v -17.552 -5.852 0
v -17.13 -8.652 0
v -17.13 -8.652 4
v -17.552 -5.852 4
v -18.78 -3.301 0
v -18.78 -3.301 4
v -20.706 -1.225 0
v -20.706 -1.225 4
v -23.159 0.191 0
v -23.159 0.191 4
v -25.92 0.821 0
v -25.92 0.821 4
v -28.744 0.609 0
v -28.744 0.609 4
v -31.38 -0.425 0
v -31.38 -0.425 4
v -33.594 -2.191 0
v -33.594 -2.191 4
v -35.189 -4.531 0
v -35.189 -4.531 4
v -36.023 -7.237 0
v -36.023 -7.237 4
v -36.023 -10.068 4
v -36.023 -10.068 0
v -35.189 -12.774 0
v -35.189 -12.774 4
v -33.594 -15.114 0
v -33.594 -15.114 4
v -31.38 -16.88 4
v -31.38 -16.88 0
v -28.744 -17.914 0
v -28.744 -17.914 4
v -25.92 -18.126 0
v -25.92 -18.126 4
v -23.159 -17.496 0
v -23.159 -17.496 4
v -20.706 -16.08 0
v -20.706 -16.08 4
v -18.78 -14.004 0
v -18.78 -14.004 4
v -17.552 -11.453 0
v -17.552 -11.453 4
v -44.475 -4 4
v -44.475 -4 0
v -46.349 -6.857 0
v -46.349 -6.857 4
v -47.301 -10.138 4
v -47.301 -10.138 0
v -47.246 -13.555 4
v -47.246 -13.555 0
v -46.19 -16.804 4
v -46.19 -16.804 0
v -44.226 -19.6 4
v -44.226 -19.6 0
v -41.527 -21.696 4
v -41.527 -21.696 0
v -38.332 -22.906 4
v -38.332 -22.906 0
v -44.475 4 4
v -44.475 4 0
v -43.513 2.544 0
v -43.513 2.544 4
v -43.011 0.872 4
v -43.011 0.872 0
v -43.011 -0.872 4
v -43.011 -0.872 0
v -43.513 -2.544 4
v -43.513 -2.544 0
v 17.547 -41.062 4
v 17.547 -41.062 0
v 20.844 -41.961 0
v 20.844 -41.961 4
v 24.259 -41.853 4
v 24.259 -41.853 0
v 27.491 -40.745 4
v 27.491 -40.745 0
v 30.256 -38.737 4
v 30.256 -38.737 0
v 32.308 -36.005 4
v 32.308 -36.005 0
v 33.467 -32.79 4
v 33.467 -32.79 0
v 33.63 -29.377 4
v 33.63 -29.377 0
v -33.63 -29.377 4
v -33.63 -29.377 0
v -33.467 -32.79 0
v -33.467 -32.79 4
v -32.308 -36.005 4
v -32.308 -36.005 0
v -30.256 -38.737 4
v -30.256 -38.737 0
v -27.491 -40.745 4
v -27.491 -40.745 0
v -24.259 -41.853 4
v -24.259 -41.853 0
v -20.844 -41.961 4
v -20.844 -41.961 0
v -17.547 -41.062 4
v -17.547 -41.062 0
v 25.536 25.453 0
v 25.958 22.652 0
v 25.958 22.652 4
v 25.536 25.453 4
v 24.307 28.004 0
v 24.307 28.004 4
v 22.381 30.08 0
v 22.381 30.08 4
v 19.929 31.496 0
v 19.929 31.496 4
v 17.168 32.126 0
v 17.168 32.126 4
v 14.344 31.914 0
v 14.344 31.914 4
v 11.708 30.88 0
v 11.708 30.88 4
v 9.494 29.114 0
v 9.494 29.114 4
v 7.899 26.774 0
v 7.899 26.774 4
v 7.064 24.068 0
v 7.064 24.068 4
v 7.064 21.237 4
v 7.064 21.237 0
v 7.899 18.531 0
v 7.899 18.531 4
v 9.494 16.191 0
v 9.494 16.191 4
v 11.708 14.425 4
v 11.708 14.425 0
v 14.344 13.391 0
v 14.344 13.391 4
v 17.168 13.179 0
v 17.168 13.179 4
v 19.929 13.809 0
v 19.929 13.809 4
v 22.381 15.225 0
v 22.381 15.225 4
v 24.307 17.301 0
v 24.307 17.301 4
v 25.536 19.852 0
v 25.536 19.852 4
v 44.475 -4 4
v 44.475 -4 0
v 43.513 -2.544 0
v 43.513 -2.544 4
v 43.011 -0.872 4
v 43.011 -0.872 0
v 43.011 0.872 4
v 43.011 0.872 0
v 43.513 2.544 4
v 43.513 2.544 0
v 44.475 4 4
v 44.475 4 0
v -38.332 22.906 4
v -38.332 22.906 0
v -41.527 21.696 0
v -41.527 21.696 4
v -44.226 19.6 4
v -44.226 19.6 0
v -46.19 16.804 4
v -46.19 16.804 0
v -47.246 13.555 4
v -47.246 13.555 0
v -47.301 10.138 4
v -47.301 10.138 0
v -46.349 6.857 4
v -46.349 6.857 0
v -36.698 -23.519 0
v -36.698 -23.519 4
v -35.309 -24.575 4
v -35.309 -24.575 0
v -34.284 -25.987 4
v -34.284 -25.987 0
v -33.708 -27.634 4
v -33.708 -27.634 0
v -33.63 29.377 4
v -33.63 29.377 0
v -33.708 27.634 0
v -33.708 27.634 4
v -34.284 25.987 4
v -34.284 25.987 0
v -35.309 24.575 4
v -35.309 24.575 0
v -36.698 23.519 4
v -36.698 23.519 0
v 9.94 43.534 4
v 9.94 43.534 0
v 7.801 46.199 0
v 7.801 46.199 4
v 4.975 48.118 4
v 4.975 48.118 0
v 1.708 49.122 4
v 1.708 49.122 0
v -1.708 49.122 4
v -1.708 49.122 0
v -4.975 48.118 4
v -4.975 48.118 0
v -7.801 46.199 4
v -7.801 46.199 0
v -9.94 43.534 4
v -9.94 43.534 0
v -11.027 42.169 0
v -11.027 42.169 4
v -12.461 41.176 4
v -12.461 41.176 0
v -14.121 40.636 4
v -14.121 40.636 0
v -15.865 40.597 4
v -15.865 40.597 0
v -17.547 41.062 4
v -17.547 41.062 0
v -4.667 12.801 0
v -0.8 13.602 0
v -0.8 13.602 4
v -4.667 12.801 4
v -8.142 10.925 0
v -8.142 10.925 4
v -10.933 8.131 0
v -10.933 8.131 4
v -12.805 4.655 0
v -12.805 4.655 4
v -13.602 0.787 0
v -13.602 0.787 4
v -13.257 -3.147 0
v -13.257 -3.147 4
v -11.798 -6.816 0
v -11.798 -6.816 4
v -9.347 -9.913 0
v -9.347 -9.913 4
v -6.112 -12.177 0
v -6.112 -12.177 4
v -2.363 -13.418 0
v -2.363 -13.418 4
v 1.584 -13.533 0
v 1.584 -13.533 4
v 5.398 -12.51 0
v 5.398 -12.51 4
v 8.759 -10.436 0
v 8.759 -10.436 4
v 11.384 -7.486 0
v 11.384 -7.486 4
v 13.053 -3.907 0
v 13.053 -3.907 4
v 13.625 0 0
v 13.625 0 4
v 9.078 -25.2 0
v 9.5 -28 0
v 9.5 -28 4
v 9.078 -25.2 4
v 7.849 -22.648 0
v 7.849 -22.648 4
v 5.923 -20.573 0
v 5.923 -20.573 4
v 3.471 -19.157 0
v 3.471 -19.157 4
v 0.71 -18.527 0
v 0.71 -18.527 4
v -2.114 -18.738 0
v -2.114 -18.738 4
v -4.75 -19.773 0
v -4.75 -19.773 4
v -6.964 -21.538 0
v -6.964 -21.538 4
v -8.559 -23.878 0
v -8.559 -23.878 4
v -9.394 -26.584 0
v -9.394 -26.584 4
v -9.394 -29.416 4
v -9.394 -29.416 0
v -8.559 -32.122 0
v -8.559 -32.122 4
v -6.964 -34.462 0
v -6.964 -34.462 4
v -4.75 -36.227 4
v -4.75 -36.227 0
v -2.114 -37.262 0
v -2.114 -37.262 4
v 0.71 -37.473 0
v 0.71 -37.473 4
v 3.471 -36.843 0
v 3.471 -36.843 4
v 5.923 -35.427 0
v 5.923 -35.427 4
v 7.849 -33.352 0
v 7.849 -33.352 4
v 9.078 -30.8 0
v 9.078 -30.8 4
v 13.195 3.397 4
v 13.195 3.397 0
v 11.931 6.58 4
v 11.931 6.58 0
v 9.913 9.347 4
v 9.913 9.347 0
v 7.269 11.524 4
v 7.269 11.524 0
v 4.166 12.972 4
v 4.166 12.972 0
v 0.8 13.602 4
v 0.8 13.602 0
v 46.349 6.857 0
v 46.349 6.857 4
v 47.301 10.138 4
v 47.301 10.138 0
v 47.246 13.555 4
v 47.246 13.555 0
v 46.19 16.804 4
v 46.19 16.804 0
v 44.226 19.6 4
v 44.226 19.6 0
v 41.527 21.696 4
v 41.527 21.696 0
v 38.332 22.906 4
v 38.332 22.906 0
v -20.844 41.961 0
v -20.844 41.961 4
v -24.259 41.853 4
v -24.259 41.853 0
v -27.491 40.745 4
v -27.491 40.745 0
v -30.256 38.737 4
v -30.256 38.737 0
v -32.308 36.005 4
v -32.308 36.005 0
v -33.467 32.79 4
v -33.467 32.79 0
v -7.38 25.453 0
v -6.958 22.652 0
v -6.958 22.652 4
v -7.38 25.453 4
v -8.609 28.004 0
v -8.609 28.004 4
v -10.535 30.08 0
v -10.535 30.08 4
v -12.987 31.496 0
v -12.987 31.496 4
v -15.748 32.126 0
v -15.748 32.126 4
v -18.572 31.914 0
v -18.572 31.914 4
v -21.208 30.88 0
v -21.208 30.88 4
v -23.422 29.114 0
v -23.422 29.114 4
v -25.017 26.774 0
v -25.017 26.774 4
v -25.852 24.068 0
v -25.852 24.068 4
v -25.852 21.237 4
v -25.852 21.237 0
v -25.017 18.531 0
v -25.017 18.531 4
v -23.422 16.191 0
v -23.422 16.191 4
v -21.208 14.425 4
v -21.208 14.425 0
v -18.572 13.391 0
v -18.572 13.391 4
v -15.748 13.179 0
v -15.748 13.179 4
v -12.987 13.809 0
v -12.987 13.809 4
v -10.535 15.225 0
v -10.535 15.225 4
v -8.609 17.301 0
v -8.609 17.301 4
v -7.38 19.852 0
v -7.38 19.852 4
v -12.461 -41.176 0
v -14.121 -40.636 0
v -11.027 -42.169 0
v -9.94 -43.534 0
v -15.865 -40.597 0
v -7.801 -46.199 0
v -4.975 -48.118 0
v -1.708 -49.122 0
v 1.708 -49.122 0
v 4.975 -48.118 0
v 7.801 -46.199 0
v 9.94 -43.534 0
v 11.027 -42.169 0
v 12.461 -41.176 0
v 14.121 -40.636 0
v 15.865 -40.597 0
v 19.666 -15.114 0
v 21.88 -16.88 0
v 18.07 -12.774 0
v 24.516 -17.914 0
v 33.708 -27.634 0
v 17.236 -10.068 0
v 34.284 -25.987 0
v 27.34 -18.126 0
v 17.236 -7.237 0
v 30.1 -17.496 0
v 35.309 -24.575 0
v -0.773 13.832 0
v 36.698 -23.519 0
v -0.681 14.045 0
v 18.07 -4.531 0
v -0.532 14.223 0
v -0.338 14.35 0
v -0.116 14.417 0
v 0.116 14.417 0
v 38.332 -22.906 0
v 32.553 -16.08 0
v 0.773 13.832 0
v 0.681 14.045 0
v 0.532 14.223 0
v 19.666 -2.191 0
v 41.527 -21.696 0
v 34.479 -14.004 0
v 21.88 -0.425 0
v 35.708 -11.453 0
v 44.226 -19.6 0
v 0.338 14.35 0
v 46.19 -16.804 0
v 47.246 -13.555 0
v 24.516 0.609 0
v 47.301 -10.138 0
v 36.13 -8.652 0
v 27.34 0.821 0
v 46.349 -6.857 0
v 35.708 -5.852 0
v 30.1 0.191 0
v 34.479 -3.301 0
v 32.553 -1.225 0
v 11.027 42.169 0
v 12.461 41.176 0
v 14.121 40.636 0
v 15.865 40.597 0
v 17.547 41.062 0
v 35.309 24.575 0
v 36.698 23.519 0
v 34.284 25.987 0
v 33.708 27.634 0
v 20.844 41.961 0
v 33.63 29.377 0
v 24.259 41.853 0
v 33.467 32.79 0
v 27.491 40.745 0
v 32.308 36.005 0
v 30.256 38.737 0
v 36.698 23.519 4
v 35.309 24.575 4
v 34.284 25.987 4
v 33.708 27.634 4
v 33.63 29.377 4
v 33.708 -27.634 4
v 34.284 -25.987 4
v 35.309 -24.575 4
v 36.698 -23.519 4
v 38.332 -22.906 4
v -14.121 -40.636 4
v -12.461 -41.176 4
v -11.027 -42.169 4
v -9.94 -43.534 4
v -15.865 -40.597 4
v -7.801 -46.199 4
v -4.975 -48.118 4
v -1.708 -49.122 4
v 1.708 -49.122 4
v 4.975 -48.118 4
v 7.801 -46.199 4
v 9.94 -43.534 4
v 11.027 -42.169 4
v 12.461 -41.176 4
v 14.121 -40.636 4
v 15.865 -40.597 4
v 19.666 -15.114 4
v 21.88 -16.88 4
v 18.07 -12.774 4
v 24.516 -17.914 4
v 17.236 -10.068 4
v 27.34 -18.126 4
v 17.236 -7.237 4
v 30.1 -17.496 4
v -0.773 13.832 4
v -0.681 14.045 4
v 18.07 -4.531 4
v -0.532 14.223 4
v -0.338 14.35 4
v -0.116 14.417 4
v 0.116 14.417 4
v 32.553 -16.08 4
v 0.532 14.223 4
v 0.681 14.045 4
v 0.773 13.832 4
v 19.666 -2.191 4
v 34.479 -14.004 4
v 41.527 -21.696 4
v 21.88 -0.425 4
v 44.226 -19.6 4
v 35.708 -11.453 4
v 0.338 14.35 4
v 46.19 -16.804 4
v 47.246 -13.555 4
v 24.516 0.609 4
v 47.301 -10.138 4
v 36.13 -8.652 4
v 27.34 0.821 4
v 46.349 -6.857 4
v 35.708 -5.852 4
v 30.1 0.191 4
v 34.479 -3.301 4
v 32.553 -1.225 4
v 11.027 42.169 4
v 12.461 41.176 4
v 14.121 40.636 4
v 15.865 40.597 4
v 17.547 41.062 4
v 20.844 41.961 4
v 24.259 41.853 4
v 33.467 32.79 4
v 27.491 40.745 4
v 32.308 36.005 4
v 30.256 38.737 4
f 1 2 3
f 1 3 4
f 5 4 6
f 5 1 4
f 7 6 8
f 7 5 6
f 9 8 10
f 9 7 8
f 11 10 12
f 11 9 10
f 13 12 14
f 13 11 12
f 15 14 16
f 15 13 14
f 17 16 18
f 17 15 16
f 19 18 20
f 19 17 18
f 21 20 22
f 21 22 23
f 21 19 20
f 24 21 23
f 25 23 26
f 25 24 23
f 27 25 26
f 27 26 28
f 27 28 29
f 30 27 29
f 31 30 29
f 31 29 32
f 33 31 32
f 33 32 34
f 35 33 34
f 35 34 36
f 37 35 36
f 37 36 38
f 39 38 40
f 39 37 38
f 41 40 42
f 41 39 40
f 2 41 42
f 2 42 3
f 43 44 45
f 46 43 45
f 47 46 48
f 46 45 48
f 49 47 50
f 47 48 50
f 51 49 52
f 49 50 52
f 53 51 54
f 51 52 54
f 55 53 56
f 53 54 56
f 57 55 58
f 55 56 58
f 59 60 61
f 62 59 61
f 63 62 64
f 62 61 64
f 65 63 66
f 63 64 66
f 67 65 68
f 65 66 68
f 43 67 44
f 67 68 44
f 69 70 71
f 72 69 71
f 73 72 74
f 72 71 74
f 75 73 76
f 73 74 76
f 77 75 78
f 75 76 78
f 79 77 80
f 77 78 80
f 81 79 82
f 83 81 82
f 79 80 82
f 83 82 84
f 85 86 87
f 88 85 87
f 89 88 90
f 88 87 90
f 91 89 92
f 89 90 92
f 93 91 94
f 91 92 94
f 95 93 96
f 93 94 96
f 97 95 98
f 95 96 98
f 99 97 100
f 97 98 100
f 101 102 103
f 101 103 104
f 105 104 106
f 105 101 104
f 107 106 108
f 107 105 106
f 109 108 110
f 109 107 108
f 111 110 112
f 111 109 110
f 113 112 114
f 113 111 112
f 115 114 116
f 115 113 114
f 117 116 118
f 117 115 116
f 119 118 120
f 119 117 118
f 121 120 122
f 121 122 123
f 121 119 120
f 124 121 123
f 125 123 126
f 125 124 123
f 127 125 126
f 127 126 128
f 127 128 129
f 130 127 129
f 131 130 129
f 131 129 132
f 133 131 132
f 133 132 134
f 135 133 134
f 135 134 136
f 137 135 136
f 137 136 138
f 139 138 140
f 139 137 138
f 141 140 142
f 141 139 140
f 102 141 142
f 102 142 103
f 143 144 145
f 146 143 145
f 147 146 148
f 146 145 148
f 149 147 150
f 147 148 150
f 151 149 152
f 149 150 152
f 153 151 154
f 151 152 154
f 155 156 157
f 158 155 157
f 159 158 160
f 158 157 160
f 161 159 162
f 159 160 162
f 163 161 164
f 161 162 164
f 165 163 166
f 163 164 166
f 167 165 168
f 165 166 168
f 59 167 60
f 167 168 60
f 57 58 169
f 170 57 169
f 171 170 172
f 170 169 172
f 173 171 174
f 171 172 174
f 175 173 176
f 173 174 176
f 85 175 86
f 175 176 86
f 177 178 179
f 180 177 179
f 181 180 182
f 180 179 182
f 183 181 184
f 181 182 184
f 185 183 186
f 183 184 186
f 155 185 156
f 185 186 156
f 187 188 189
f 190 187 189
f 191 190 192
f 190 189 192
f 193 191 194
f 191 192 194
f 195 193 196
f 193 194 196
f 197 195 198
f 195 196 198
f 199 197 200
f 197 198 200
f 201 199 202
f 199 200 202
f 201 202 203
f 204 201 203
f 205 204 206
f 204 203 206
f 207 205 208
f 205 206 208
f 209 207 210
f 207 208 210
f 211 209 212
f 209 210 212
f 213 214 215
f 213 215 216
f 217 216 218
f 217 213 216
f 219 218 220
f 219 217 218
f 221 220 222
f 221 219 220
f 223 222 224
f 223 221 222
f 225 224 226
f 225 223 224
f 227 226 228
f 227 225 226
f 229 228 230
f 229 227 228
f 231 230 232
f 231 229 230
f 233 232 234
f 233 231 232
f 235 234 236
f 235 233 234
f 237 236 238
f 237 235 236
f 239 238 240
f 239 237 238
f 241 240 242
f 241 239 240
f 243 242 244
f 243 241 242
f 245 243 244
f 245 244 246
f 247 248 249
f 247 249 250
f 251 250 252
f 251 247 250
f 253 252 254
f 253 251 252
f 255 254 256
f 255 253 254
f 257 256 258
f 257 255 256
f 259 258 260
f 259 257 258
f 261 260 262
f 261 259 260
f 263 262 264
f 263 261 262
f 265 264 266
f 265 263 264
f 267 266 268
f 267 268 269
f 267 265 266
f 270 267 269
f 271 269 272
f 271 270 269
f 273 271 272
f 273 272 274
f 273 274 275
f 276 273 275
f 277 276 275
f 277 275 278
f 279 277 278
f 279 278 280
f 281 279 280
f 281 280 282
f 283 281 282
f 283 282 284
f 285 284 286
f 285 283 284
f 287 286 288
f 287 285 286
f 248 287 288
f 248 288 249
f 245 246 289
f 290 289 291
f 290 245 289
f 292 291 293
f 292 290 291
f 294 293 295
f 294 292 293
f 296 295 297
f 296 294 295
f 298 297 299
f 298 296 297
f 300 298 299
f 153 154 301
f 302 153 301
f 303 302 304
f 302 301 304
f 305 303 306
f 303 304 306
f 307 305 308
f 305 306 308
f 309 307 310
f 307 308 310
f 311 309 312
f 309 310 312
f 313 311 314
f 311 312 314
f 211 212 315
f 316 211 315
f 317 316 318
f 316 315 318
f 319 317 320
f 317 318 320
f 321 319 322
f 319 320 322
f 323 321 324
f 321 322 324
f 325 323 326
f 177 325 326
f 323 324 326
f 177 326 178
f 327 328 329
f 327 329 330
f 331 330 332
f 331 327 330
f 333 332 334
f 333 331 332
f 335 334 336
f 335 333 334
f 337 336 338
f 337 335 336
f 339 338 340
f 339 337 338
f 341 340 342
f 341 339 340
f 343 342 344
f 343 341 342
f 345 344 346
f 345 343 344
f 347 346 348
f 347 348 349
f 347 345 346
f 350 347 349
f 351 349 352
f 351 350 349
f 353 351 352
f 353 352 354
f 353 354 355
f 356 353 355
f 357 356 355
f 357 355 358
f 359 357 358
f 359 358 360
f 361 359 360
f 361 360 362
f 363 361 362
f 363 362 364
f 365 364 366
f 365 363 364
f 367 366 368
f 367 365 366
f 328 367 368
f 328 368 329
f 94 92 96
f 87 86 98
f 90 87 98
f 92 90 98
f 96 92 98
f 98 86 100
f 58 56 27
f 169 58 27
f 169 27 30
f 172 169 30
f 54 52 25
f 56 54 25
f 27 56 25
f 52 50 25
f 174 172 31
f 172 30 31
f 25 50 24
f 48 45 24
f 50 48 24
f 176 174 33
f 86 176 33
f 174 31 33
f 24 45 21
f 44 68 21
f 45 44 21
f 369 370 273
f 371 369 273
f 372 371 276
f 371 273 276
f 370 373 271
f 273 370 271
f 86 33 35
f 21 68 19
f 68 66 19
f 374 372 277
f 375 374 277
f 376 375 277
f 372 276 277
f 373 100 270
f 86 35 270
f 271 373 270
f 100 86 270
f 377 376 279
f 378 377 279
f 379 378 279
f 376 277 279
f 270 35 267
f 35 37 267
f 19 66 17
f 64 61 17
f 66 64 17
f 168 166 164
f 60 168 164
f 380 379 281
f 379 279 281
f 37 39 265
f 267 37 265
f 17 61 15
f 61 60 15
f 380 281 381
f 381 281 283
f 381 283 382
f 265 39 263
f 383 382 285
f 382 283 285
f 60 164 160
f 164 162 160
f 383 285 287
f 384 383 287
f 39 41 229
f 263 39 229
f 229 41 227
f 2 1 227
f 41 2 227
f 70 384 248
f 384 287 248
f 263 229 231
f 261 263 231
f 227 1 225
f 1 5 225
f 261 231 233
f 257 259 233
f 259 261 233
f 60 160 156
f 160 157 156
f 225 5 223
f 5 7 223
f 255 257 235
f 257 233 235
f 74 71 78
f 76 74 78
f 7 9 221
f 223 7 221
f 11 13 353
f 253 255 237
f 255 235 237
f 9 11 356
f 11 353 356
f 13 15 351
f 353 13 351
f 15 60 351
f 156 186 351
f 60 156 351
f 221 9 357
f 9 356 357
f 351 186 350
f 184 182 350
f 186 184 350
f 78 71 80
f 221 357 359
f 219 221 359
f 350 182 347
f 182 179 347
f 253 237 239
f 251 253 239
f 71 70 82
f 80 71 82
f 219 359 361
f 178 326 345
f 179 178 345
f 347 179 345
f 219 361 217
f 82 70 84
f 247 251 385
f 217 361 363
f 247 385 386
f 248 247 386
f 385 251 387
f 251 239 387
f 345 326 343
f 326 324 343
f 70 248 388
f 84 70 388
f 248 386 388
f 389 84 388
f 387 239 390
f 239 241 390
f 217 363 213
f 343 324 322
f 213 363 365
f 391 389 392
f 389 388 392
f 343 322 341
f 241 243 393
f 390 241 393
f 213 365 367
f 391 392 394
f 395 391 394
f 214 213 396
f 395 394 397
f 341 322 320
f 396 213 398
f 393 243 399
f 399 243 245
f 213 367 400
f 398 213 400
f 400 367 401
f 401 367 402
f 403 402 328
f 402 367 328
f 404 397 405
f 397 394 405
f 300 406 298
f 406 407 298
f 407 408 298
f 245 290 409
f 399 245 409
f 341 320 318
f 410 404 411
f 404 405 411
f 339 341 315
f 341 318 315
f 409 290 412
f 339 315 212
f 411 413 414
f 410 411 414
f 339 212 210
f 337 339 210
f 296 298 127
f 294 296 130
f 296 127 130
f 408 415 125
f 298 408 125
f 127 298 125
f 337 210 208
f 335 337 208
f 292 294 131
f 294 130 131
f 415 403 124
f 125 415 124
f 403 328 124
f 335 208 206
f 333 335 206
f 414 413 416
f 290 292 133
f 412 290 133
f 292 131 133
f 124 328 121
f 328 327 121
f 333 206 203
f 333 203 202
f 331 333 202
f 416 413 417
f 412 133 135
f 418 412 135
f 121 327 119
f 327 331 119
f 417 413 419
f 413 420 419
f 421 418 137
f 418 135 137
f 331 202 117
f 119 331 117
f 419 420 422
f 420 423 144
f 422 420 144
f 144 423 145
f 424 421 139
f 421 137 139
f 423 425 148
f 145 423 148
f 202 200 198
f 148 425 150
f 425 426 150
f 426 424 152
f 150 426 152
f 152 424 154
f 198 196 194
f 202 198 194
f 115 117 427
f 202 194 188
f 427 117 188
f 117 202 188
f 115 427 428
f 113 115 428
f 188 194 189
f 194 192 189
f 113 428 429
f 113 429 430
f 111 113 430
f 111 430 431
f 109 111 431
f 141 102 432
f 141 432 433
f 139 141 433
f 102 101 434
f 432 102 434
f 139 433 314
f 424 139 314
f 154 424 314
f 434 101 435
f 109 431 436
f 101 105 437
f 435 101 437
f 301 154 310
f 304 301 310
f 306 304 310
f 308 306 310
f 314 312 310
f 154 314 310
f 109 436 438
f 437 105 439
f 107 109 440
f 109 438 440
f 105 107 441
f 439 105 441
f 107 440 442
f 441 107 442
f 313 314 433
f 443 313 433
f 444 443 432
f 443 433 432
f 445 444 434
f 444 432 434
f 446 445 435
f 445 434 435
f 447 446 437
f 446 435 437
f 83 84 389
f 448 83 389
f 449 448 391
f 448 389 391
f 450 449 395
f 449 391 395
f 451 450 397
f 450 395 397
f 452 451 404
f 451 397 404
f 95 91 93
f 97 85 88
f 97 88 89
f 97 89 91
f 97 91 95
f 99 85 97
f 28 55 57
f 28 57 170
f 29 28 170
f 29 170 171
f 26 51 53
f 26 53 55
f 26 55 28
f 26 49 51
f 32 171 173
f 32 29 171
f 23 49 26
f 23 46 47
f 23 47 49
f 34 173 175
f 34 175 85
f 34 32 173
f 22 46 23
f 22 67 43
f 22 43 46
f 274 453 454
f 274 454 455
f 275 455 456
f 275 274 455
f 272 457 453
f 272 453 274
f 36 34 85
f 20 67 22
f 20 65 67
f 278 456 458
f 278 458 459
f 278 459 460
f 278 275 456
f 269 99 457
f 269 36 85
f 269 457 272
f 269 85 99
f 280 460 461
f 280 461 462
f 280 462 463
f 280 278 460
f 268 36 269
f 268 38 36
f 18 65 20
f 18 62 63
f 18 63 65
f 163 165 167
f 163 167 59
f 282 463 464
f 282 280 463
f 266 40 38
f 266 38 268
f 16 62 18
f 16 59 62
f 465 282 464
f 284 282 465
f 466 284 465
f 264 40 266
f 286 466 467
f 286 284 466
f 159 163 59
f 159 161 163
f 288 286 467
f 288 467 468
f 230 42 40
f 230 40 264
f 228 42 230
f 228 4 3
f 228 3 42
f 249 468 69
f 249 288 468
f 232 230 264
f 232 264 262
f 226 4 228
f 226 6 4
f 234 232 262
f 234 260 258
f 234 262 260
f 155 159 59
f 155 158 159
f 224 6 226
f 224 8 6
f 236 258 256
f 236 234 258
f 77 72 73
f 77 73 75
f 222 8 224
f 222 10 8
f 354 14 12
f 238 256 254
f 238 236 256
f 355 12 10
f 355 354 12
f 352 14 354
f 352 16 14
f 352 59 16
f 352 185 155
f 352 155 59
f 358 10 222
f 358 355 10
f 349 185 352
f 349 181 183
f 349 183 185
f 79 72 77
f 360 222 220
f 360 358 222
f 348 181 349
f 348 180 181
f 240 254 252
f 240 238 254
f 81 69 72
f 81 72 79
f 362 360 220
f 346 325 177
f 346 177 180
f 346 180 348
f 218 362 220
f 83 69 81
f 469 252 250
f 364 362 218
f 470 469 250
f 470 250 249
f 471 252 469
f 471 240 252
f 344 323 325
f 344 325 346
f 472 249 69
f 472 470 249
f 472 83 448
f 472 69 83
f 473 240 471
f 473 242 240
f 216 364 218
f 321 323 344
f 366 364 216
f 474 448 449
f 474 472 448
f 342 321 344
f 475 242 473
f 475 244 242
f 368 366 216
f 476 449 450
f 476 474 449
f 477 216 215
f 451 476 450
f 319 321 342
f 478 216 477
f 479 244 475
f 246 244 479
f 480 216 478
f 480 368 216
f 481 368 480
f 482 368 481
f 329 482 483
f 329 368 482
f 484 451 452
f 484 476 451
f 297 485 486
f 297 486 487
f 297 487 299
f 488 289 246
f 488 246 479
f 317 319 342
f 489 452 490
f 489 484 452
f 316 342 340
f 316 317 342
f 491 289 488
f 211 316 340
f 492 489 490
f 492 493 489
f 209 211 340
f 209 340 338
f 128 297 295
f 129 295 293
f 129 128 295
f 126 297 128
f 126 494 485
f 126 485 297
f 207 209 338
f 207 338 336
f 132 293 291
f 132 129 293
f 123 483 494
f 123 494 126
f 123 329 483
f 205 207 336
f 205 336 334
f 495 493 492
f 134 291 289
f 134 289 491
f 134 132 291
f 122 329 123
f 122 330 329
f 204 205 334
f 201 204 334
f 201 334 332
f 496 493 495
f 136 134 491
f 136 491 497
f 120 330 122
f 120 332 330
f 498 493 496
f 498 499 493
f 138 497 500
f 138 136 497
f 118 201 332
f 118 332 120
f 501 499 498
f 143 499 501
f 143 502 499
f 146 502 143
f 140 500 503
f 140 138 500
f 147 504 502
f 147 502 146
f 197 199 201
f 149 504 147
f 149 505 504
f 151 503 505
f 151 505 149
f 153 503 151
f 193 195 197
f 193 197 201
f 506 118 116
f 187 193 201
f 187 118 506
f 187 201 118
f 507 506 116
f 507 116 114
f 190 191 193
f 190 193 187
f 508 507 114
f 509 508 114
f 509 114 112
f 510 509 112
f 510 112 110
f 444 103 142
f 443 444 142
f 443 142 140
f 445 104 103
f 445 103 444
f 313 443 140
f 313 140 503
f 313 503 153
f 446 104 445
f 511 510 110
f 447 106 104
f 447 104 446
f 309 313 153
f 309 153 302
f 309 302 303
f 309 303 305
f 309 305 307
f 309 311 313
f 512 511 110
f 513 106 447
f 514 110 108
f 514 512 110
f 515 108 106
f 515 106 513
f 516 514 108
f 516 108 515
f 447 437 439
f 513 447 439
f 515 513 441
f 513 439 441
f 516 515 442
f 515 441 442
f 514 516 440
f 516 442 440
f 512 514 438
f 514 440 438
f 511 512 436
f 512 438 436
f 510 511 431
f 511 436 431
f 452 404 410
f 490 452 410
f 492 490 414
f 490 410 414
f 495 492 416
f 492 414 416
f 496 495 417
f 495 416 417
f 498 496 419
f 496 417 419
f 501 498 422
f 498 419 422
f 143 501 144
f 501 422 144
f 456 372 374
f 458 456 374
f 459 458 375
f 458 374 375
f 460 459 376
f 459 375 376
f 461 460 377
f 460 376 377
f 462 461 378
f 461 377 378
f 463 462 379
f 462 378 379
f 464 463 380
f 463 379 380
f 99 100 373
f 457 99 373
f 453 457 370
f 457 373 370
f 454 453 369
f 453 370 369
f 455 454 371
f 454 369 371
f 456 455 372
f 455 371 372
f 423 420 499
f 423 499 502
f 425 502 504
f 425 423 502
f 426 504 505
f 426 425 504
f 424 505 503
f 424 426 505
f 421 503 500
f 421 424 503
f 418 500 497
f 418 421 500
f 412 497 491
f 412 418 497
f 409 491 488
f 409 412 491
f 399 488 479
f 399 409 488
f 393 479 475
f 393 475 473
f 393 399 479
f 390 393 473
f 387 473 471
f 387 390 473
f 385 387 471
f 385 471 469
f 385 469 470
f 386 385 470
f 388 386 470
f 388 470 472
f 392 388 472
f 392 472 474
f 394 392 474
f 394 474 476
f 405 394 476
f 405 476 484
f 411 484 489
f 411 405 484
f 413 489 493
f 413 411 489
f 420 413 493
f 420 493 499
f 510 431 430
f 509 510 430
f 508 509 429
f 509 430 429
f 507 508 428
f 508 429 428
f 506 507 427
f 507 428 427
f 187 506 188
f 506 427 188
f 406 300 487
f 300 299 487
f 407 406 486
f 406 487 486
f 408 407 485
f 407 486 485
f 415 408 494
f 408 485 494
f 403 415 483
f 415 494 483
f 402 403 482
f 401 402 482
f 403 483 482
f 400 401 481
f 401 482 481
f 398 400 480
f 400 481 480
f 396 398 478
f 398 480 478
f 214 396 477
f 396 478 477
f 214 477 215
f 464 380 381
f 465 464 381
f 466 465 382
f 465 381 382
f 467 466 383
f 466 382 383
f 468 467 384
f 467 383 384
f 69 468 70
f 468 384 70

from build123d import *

# Parameters (mm, degrees)
SKETCH_1_R          = 13.625
SKETCH_1_R_2        = 9.5
EXTRUDE_1_DEPTH     = 4
SKETCH_2_R          = 0.8
CUT_EXTRUDE_1_DEPTH = 10


with BuildPart() as part:
    # 草图1 → 凸台-拉伸1 (new body)
    with BuildSketch(Plane.XY):
        with BuildLine():
            ThreePointArc((-9.939636128, -43.533911621), (0, -49.25), (9.939636128, -43.533911621))
            ThreePointArc((9.939636128, -43.533911621), (13.271431273, -40.845265542), (17.547256679, -41.062045862))
            ThreePointArc((17.547256679, -41.062045862), (28.948423675, -39.844086973), (33.629925771, -29.377302803))
            ThreePointArc((33.629925771, -29.377302803), (34.745058151, -25.243762385), (38.331693845, -22.905874232))
            ThreePointArc((38.331693845, -22.905874232), (46.839533428, -15.219086973), (44.474726808, -3.999562813))
            ThreePointArc((44.474726808, -3.999562813), (42.947253757, 0), (44.474726808, 3.999562813))
            ThreePointArc((44.474726808, 3.999562813), (46.839533428, 15.219086973), (38.331693845, 22.905874232))
            ThreePointArc((38.331693845, 22.905874232), (34.745058151, 25.243762385), (33.629925771, 29.377302803))
            ThreePointArc((33.629925771, 29.377302803), (28.948423675, 39.844086973), (17.547256679, 41.062045862))
            ThreePointArc((17.547256679, 41.062045862), (13.271431273, 40.845265542), (9.939636128, 43.533911621))
            ThreePointArc((9.939636128, 43.533911621), (0, 49.25), (-9.939636128, 43.533911621))
            ThreePointArc((-9.939636128, 43.533911621), (-13.271431273, 40.845265542), (-17.547256679, 41.062045862))
            ThreePointArc((-17.547256679, 41.062045862), (-28.948423675, 39.844086973), (-33.629925771, 29.377302803))
            ThreePointArc((-33.629925771, 29.377302803), (-34.745058151, 25.243762385), (-38.331693845, 22.905874232))
            ThreePointArc((-38.331693845, 22.905874232), (-46.839533428, 15.219086973), (-44.474726808, 3.999562813))
            ThreePointArc((-44.474726808, 3.999562813), (-42.947253757, 0), (-44.474726808, -3.999562813))
            ThreePointArc((-44.474726808, -3.999562813), (-46.839533428, -15.219086973), (-38.331693845, -22.905874232))
            ThreePointArc((-38.331693845, -22.905874232), (-34.745058151, -25.243762385), (-33.629925771, -29.377302803))
            ThreePointArc((-33.629925771, -29.377302803), (-28.948423675, -39.844086973), (-17.547256679, -41.062045862))
            ThreePointArc((-17.547256679, -41.062045862), (-13.271431273, -40.845265542), (-9.939636128, -43.533911621))
        make_face()
        Circle(SKETCH_1_R, mode=Mode.SUBTRACT)
        with Locations((0, -28)):
            Circle(SKETCH_1_R_2, mode=Mode.SUBTRACT)
        with Locations((-26.629582456, -8.652475842)):
            Circle(SKETCH_1_R_2, mode=Mode.SUBTRACT)
        with Locations((-16.457987064, 22.652475842)):
            Circle(SKETCH_1_R_2, mode=Mode.SUBTRACT)
        with Locations((16.457987064, 22.652475842)):
            Circle(SKETCH_1_R_2, mode=Mode.SUBTRACT)
        with Locations((26.629582456, -8.652475842)):
            Circle(SKETCH_1_R_2, mode=Mode.SUBTRACT)
    extrude(amount=EXTRUDE_1_DEPTH)

    # 草图2 → 切除-拉伸1 (cut)
    with BuildSketch(Plane.XY.offset(4)):
        with Locations((0, 13.625)):
            Circle(SKETCH_2_R)
    extrude(amount=-CUT_EXTRUDE_1_DEPTH, mode=Mode.SUBTRACT)


solid = part.part
